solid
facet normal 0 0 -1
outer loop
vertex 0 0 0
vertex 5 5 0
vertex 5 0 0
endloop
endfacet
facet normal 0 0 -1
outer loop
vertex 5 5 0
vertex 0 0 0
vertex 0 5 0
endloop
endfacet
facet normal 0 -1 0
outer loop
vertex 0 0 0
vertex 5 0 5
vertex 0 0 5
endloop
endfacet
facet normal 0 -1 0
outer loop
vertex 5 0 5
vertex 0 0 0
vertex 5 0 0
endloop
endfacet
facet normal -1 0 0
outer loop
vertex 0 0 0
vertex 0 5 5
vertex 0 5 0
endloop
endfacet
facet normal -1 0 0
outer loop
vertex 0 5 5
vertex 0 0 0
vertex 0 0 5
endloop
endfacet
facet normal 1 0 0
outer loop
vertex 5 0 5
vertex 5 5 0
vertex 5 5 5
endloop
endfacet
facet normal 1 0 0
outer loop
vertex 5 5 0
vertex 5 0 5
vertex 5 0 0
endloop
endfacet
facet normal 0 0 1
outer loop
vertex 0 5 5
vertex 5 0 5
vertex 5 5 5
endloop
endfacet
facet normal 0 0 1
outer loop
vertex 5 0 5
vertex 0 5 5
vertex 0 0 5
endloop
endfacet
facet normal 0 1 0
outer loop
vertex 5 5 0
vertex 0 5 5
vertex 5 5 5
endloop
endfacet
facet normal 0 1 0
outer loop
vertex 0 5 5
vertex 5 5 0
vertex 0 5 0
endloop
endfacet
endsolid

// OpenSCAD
// A closed polyhedron whose faces all point inwards: the result must not be
// inside out (#7201).
points = [[0,0,0],[10,0,0],[10,10,0],[0,10,0],[0,0,10],[10,0,10],[10,10,10],[0,10,10]];
faces = [[0,1,2,3],[4,5,1,0],[7,6,5,4],[5,6,2,1],[6,7,3,2],[7,4,0,3]];
intersection() {
  polyhedron(points, [for (f = faces) [for (i = [len(f) - 1 : -1 : 0]) f[i]]]);
  cube(5);
}
